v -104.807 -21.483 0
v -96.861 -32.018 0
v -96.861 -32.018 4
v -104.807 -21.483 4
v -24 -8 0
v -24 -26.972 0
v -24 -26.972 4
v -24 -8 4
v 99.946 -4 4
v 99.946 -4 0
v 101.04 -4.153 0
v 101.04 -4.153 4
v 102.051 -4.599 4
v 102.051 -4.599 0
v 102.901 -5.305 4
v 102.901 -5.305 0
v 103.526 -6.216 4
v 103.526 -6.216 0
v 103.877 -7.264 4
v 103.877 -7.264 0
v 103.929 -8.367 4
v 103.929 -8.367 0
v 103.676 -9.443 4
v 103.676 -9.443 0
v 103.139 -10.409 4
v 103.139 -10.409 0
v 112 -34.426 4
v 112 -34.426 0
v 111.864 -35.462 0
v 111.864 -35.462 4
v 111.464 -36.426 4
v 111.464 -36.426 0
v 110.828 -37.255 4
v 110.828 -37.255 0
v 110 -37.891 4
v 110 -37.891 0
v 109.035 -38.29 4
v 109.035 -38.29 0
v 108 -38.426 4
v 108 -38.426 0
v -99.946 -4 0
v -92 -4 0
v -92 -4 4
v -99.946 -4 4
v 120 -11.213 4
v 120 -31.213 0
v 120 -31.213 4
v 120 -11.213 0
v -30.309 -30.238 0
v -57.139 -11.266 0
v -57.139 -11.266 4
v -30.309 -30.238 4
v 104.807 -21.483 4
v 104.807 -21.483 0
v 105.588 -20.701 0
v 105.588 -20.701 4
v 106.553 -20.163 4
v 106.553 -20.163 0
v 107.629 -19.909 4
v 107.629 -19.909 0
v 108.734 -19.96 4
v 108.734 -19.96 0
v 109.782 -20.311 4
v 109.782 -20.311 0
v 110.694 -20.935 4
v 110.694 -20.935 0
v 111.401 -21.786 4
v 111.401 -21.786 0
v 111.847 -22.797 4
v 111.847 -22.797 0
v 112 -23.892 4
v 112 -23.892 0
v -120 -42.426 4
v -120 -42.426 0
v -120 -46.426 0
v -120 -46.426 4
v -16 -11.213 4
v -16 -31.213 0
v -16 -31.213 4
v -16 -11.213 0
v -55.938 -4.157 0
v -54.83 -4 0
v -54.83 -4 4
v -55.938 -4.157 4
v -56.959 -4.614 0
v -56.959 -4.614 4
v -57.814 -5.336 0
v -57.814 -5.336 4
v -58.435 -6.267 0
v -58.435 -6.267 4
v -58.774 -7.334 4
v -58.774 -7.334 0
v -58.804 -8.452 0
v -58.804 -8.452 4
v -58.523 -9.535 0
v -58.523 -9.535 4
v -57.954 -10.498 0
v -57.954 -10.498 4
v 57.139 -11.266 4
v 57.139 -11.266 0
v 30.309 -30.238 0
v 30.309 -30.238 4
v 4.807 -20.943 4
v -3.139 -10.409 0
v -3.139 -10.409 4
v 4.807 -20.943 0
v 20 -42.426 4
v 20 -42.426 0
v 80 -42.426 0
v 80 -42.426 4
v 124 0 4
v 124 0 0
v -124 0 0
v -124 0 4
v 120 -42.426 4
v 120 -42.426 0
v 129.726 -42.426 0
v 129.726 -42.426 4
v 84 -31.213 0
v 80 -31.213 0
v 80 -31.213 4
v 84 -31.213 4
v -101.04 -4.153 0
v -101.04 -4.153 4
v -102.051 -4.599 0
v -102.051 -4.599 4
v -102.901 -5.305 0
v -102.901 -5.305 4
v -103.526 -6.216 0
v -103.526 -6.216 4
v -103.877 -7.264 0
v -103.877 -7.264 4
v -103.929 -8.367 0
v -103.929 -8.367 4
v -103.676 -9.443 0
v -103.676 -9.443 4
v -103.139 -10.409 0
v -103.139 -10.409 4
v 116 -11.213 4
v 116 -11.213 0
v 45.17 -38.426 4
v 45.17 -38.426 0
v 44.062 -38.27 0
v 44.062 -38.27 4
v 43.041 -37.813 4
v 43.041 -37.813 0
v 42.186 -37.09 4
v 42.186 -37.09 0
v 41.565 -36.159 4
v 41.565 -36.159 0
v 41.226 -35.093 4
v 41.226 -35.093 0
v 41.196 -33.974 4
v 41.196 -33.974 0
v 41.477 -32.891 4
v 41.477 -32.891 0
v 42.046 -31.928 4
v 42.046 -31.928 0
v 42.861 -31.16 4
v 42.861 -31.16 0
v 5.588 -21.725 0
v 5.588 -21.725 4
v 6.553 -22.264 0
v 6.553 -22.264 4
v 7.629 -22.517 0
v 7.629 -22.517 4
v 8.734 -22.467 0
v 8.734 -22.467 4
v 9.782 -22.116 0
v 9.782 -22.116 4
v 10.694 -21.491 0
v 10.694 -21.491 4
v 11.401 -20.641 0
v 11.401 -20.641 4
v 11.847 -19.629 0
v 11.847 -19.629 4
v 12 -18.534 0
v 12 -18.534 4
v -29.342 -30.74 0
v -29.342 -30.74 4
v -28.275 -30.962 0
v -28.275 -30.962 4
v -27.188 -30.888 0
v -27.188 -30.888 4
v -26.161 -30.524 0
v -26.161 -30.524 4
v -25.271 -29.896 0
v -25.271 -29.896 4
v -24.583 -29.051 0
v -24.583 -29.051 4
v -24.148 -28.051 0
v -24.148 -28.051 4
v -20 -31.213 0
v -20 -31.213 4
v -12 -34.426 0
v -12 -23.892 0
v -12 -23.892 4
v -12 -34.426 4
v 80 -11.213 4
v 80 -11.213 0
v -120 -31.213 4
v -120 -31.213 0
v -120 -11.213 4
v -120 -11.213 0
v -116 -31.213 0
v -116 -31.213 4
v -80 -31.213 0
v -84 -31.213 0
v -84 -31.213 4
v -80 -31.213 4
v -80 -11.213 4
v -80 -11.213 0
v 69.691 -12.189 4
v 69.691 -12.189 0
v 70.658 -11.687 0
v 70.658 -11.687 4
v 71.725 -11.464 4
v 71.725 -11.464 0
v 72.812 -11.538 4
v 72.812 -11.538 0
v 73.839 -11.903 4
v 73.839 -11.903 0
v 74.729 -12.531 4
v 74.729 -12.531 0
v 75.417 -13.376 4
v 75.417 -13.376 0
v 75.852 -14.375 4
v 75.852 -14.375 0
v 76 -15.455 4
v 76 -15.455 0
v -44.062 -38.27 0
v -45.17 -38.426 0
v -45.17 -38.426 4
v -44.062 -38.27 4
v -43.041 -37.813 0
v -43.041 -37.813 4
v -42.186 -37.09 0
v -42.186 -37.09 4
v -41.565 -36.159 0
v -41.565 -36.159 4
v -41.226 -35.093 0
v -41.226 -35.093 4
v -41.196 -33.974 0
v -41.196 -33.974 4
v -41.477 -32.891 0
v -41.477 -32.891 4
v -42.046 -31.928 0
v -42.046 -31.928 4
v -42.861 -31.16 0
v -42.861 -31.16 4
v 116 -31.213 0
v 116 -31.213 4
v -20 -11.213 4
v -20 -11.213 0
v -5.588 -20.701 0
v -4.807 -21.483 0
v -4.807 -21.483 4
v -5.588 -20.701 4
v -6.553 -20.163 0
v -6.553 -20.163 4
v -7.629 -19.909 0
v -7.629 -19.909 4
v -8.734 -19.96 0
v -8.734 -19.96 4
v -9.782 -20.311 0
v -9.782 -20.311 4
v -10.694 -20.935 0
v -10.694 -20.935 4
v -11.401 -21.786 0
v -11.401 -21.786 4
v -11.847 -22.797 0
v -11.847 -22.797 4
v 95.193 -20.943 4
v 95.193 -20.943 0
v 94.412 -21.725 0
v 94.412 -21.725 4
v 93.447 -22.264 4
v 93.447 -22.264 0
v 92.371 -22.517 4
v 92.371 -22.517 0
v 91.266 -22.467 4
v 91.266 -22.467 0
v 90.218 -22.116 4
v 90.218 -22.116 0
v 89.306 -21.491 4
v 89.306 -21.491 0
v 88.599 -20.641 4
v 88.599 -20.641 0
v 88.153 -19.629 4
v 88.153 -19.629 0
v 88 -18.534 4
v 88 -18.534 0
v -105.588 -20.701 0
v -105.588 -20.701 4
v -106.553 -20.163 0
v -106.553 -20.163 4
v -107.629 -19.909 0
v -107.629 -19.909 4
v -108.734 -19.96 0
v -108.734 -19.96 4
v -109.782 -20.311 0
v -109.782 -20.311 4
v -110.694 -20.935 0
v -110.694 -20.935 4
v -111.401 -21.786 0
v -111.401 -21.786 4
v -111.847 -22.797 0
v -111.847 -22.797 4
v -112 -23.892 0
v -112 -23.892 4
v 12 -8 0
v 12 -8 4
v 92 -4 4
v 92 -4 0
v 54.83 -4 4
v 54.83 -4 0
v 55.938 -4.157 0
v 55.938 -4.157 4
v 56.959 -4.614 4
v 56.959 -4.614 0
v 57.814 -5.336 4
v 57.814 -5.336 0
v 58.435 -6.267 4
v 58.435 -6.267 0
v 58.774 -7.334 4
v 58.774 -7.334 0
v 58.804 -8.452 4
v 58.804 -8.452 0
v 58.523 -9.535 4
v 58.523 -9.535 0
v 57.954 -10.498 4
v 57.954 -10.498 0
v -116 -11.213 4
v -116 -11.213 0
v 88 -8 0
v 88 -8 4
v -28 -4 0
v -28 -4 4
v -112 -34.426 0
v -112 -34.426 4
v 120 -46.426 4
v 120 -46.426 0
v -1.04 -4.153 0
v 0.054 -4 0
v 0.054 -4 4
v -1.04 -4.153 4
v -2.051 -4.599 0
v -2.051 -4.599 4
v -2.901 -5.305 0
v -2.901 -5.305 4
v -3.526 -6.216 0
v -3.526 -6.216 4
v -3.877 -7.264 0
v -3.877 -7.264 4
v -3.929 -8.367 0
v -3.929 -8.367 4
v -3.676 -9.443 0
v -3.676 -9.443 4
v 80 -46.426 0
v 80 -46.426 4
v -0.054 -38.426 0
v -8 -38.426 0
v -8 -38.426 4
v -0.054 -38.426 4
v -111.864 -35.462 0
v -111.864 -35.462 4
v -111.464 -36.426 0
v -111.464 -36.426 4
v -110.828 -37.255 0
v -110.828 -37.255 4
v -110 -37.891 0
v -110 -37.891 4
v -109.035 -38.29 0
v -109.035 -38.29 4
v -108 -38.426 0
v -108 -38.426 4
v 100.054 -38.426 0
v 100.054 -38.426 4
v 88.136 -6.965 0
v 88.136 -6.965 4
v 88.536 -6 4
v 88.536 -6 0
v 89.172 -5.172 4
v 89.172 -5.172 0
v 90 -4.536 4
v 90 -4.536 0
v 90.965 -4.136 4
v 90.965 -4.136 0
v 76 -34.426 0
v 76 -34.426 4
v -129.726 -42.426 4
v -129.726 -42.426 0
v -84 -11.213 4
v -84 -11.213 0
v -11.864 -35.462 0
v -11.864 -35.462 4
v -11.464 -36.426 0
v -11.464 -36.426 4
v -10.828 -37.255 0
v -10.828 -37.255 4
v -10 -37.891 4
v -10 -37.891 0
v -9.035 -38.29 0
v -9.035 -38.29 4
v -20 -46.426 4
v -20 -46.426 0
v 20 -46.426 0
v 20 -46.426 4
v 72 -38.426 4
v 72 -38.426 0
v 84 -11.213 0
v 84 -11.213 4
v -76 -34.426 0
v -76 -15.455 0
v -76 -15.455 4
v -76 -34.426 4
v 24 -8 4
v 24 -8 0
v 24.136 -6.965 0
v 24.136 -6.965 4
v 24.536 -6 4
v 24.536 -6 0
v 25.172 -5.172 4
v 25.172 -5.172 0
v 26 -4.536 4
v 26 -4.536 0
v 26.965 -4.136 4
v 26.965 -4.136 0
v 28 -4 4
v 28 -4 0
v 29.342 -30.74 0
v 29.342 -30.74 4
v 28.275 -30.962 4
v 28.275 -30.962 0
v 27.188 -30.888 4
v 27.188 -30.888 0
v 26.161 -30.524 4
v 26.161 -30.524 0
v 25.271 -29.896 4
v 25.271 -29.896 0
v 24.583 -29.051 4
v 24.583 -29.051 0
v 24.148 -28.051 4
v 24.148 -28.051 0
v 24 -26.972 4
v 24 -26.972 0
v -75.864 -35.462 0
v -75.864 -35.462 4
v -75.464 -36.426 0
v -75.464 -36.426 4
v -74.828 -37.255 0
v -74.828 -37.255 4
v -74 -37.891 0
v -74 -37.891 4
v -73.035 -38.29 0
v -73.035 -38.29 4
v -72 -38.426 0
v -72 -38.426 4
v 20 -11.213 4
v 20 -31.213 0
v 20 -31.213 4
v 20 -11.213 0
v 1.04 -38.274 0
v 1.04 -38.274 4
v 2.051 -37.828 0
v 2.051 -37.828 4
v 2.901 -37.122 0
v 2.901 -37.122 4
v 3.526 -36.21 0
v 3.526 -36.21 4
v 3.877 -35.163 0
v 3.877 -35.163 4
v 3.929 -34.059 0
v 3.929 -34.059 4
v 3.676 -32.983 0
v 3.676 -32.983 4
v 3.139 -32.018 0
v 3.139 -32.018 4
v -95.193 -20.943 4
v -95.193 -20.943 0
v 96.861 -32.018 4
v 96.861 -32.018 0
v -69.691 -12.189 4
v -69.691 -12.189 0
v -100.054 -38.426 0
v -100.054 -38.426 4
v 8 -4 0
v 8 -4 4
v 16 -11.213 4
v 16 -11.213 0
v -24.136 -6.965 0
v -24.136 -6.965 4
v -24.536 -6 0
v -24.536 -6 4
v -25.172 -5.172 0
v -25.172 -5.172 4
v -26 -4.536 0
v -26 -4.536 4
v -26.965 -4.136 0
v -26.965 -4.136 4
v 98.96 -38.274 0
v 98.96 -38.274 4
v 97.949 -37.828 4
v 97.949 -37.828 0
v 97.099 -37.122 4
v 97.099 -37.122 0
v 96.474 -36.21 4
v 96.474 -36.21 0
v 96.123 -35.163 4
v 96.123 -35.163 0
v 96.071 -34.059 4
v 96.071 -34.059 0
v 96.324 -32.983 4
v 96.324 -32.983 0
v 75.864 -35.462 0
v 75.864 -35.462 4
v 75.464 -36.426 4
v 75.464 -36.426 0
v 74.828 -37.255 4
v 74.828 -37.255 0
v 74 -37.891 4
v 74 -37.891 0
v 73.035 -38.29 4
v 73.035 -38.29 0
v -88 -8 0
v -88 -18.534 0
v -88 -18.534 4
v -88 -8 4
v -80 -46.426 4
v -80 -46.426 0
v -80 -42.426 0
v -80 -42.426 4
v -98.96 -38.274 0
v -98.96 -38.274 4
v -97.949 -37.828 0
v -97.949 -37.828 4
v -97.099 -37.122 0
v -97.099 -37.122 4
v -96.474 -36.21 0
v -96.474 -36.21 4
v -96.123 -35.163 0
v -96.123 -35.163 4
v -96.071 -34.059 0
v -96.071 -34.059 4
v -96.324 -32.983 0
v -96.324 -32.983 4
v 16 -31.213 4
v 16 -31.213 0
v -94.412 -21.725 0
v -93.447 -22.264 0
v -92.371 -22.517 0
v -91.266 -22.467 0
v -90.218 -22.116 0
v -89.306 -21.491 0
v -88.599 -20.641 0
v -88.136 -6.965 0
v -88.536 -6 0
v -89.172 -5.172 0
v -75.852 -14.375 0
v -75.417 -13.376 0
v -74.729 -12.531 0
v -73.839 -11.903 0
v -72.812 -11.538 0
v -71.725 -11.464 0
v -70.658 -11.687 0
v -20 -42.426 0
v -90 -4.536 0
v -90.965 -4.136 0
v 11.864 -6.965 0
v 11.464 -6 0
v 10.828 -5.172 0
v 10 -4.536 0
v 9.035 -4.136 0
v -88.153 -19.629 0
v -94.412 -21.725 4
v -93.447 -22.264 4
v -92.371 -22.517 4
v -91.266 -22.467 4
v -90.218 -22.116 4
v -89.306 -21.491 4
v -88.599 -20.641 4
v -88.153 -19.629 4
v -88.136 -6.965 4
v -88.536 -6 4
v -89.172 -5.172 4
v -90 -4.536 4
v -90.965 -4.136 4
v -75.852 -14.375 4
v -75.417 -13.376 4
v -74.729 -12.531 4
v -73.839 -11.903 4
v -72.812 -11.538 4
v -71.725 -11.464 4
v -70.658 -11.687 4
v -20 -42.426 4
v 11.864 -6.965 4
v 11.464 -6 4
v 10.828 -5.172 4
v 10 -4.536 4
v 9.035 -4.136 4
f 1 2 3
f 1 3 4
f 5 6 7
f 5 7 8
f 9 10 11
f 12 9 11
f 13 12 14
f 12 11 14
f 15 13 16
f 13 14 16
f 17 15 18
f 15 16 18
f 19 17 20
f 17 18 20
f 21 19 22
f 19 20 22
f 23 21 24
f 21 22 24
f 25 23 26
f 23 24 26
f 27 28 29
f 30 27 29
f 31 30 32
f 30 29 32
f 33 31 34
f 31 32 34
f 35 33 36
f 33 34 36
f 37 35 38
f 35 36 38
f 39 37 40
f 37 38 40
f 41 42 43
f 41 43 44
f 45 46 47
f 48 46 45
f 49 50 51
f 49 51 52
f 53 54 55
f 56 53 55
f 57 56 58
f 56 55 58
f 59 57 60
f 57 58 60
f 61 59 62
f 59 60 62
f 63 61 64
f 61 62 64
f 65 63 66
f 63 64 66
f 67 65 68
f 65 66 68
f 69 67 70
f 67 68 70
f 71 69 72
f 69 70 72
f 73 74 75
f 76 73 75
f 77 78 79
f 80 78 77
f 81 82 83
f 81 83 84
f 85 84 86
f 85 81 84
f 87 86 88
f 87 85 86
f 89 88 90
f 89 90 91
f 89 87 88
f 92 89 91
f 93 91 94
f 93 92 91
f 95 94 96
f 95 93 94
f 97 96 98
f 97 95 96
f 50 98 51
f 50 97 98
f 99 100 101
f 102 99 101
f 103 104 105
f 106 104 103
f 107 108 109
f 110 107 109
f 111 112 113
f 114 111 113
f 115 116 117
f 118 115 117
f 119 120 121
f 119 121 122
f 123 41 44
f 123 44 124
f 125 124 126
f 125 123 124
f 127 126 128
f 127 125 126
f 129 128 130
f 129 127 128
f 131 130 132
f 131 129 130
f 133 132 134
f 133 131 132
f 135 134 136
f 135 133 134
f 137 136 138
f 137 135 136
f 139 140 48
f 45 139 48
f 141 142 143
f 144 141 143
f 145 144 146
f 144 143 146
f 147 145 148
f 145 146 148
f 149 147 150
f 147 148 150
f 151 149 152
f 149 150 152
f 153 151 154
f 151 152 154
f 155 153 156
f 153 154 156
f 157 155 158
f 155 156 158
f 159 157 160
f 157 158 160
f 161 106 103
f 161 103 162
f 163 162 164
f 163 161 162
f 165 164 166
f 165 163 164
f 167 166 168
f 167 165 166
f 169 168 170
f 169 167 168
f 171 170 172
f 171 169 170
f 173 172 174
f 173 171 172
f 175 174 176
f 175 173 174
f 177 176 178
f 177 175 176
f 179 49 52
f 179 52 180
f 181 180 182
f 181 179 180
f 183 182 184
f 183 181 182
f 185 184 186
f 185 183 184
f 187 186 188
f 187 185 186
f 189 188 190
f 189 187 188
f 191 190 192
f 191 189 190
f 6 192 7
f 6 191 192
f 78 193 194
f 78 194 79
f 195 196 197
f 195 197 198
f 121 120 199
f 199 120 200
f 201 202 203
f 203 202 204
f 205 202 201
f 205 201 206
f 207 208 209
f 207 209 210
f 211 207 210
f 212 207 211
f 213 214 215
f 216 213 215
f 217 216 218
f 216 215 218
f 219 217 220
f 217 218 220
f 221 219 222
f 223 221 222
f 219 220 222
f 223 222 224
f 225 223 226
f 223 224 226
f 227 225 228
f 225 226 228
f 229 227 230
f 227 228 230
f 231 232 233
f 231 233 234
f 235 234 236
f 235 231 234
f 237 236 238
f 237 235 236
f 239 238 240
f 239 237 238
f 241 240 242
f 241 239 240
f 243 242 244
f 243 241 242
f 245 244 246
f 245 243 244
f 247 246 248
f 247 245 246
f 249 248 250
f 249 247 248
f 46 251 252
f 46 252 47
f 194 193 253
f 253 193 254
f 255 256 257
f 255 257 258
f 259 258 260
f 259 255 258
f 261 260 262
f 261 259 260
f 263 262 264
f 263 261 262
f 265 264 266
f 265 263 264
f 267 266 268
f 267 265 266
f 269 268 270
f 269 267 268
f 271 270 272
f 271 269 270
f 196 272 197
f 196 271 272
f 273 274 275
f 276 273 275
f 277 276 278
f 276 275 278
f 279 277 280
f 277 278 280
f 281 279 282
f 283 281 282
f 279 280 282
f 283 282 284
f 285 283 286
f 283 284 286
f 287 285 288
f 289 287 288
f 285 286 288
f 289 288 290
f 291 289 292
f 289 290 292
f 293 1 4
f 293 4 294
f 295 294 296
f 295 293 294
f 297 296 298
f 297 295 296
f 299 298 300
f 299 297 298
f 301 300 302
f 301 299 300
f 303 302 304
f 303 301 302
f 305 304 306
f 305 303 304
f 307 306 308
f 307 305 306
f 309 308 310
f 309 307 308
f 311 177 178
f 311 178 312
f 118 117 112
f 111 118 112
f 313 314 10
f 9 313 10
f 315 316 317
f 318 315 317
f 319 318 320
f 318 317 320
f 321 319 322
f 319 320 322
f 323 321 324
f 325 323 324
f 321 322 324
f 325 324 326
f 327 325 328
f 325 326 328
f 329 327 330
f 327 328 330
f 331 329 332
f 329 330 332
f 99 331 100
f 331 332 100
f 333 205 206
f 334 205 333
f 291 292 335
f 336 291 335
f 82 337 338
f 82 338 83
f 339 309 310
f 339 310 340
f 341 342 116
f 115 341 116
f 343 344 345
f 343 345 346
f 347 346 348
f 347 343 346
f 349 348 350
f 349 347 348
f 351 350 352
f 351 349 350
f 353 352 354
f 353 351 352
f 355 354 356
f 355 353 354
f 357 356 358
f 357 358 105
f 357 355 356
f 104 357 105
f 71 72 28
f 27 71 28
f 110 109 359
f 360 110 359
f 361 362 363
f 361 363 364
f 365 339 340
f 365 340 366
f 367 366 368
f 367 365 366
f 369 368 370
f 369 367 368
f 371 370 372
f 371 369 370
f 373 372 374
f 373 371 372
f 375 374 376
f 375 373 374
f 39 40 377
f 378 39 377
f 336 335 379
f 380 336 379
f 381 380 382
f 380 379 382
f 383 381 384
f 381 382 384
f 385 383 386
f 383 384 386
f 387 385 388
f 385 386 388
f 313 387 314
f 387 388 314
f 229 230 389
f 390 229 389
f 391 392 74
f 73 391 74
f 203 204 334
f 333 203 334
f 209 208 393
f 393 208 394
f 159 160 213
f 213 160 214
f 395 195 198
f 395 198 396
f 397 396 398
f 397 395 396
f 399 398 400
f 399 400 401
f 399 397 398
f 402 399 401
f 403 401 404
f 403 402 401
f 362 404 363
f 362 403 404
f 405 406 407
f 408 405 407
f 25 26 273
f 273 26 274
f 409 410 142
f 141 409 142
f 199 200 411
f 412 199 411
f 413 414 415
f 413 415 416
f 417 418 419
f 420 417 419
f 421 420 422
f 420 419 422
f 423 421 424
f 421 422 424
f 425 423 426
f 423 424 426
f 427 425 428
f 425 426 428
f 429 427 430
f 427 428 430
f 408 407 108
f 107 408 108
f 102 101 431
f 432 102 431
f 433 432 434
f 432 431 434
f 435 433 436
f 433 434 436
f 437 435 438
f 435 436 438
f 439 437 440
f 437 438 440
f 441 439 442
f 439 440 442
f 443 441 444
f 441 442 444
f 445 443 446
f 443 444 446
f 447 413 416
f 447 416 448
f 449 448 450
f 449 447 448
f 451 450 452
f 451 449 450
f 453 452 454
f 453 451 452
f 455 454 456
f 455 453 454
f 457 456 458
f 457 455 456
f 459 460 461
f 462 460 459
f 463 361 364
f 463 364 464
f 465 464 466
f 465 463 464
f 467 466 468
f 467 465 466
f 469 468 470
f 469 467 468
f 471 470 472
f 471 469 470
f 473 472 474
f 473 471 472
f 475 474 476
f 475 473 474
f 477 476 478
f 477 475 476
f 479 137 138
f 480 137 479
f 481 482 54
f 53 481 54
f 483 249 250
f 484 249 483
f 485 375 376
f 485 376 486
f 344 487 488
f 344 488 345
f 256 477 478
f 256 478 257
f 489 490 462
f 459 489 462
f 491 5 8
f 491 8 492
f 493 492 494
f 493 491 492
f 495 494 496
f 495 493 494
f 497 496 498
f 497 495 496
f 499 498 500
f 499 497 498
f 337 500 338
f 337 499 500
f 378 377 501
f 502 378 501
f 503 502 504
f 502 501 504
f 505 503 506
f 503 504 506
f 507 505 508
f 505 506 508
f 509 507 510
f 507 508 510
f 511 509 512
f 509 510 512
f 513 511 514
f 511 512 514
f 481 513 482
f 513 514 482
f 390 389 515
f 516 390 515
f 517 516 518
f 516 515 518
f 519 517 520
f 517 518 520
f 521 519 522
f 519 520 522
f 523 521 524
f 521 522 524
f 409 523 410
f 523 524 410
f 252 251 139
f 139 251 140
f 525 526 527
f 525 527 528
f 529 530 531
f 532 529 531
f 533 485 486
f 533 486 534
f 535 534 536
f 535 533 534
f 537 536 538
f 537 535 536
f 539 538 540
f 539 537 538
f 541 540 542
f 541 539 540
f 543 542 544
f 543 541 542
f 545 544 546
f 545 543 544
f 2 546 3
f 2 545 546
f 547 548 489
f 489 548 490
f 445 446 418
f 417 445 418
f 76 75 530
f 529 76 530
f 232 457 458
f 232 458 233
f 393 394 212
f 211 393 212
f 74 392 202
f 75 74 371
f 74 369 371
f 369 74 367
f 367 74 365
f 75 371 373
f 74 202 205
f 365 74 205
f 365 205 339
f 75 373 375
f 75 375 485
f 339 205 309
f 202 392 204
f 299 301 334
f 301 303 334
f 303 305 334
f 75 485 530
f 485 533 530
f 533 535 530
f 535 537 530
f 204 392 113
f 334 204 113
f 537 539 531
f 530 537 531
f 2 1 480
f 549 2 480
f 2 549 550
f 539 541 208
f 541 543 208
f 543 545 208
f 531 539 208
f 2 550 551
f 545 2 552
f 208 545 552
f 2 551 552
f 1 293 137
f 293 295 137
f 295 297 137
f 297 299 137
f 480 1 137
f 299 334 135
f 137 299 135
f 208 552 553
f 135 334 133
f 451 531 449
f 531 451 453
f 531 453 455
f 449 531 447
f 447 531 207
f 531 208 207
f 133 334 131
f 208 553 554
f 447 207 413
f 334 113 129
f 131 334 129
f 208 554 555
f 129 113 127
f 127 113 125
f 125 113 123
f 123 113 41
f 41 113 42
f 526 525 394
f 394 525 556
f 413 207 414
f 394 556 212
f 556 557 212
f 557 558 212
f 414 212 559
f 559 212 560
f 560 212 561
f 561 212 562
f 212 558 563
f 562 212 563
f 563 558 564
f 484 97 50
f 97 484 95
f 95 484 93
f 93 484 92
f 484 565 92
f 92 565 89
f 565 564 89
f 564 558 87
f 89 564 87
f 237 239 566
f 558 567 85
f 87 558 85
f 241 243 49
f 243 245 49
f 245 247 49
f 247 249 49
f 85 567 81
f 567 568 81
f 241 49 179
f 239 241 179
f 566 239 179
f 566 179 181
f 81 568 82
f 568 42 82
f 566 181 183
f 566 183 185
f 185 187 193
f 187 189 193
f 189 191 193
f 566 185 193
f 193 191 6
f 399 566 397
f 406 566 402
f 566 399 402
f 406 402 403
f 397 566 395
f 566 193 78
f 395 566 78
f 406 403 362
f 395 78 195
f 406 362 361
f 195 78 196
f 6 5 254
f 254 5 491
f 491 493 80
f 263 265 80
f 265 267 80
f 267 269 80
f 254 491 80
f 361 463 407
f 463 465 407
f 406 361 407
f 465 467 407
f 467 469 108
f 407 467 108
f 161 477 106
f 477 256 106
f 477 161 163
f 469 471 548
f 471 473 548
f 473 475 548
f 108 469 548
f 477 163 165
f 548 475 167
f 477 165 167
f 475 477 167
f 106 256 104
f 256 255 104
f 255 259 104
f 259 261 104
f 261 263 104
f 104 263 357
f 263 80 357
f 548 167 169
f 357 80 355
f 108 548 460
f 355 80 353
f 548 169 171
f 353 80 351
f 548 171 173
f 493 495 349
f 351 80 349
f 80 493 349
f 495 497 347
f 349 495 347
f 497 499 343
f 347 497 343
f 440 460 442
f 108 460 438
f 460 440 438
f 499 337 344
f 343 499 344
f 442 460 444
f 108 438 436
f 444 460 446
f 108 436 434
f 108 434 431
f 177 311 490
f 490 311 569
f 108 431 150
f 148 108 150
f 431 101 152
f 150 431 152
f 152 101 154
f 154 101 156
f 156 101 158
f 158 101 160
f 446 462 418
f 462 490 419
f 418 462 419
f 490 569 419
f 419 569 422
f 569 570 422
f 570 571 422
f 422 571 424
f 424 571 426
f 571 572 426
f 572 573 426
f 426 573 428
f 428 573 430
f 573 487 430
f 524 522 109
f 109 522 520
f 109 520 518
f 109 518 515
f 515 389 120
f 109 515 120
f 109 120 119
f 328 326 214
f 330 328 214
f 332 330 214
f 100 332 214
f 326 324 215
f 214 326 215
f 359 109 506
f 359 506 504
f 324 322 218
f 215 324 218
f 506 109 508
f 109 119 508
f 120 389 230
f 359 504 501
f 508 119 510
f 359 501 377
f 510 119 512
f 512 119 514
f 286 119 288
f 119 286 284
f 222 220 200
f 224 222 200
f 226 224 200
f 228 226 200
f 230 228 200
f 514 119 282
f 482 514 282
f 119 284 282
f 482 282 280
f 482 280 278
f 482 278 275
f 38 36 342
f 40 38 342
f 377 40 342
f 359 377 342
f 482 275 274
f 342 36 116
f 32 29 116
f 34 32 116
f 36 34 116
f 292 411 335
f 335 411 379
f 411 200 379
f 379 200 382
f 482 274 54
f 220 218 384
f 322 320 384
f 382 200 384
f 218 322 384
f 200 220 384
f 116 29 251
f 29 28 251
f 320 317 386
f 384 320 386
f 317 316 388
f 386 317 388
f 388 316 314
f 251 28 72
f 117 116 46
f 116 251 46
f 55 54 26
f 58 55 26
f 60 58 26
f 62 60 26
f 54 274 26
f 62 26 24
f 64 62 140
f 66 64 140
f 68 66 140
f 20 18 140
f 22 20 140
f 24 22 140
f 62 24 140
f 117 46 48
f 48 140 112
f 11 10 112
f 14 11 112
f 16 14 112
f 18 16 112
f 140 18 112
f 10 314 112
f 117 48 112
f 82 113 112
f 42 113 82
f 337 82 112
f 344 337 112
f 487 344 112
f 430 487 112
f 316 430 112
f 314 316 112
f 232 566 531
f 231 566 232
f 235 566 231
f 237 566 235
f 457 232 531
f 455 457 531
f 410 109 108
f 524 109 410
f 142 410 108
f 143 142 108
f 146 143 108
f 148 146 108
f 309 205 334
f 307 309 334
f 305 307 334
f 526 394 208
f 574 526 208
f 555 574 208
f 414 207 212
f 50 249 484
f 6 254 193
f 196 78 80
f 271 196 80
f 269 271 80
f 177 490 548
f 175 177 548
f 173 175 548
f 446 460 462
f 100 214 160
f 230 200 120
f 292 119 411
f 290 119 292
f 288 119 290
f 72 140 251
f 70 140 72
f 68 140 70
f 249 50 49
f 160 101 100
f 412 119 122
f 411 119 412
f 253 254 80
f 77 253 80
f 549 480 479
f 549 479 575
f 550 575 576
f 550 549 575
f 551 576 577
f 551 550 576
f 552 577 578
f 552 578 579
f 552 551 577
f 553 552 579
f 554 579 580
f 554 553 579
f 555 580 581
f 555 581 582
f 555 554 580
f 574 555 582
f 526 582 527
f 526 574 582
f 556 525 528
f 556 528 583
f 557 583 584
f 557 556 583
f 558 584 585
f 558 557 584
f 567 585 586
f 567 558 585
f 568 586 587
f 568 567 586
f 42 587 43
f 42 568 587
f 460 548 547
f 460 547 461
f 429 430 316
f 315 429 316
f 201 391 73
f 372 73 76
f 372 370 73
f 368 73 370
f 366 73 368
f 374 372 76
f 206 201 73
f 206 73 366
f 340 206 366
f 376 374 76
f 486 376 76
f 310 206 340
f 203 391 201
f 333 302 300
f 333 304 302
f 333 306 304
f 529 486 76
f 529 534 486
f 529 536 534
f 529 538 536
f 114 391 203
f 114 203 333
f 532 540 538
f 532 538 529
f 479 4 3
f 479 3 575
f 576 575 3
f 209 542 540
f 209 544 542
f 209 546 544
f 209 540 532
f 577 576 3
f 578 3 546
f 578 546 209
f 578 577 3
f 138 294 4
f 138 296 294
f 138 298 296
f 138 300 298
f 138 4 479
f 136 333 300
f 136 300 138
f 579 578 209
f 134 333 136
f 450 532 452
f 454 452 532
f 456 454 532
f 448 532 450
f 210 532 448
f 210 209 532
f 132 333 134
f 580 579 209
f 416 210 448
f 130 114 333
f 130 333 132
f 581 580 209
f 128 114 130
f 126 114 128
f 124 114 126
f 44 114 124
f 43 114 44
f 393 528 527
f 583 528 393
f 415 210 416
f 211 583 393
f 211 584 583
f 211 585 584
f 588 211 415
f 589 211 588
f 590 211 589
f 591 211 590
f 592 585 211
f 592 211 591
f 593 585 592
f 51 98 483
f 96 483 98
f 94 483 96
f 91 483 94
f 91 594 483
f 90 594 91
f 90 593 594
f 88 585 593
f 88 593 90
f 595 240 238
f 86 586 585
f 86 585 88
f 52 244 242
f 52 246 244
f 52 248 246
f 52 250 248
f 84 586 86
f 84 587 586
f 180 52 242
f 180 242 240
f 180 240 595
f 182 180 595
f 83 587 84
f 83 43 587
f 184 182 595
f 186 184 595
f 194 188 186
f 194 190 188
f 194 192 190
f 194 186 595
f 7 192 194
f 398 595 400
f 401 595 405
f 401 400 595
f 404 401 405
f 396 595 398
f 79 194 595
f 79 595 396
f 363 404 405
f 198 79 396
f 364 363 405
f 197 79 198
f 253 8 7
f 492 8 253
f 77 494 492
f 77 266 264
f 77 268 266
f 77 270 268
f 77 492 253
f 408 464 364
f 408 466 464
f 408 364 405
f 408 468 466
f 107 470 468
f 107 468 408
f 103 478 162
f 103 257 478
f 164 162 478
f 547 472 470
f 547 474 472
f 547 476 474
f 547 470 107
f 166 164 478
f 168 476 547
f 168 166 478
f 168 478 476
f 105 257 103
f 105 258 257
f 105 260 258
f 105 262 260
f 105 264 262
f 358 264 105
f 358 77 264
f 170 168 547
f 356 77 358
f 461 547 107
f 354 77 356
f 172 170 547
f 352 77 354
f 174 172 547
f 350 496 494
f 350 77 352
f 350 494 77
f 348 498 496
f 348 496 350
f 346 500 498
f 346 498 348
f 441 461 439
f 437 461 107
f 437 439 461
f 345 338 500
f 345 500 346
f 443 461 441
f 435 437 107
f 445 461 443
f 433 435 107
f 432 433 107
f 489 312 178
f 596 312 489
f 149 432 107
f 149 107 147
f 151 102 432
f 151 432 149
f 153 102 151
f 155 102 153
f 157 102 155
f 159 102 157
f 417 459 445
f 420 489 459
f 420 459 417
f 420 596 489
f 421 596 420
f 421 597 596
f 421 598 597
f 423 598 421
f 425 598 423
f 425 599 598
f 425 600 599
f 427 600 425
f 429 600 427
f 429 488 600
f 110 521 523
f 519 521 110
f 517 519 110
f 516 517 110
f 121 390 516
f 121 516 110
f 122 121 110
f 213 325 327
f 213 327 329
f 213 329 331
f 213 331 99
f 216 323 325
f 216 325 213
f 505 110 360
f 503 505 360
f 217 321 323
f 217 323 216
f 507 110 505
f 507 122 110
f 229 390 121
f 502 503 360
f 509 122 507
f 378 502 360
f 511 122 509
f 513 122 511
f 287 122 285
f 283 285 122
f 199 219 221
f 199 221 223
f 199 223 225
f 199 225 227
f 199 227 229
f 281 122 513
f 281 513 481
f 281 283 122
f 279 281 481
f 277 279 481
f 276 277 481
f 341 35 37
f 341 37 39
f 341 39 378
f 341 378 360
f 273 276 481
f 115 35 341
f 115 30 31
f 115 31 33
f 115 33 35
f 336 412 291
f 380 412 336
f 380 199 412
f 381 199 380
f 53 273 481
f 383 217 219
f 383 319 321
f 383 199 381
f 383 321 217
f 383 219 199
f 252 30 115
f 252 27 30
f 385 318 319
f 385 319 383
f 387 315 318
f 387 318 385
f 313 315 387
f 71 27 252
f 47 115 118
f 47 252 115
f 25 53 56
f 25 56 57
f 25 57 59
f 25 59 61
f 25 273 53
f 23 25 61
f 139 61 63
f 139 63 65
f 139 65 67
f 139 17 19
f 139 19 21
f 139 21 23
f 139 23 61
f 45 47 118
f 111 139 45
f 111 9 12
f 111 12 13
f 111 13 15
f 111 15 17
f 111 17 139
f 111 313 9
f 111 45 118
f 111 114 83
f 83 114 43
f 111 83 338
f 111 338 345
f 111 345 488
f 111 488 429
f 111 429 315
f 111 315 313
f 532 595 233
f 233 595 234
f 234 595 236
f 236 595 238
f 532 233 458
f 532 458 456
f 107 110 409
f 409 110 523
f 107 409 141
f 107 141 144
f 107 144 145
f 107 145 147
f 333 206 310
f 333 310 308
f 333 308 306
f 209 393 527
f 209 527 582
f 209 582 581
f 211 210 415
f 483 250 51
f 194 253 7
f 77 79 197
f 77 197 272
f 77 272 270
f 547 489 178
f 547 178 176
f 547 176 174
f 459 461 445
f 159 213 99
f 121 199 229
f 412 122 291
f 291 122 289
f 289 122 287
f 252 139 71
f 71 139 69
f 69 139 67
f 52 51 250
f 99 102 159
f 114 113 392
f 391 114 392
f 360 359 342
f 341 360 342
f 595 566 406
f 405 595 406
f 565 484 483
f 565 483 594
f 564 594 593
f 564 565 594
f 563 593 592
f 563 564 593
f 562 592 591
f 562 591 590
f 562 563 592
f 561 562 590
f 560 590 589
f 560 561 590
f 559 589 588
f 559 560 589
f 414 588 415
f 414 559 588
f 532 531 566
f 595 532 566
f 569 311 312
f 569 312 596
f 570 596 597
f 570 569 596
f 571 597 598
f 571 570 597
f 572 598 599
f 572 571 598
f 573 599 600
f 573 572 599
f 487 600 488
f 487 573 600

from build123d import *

# Parameters (mm, degrees)
SKETCH2_W           = 4
SKETCH2_H           = 20
BOSS_EXTRUDE1_DEPTH = 4


with BuildPart() as part:
    # Sketch2 → Boss-Extrude1 (new body)
    with BuildSketch(Plane.XY):
        Polygon((124, 0), (-124, 0), (-129.725981227, -42.426406871), (-120, -42.426406871), (-120, -46.426406871), (-80, -46.426406871), (-80, -42.426406871), (-20, -42.426406871), (-20, -46.426406871), (20, -46.426406871), (20, -42.426406871), (80, -42.426406871), (80, -46.426406871), (120, -46.426406871), (120, -42.426406871), (129.725981227, -42.426406871), align=None)
        with BuildLine():
            Line((-88, -18.534474898), (-88, -8))
            ThreePointArc((-88, -8), (-89.171572875, -5.171572875), (-92, -4))
            Line((-92, -4), (-99.945598546, -4))
            ThreePointArc((-99.945598546, -4), (-103.525730324, -6.215999874), (-103.139076318, -10.408671774))
            Line((-103.139076318, -10.408671774), (-95.193477772, -20.943146672))
            ThreePointArc((-95.193477772, -20.943146672), (-90.729943129, -22.327488943), (-88, -18.534474898))
        make_face(mode=Mode.SUBTRACT)
        with BuildLine():
            Line((-108, -38.426406871), (-100.054401454, -38.426406871))
            ThreePointArc((-100.054401454, -38.426406871), (-96.474269676, -36.210406998), (-96.860923682, -32.017735097))
            Line((-96.860923682, -32.017735097), (-104.806522228, -21.483260199))
            ThreePointArc((-104.806522228, -21.483260199), (-109.270056871, -20.098917928), (-112, -23.891931973))
            Line((-112, -23.891931973), (-112, -34.426406871))
            ThreePointArc((-112, -34.426406871), (-110.828427125, -37.254833996), (-108, -38.426406871))
        make_face(mode=Mode.SUBTRACT)
        with BuildLine():
            Line((-57.139286117, -11.265986324), (-30.309401077, -30.237579974))
            ThreePointArc((-30.309401077, -30.237579974), (-26.161196626, -30.523888986), (-24, -26.971593651))
            Line((-24, -26.971593651), (-24, -8))
            ThreePointArc((-24, -8), (-25.171572875, -5.171572875), (-28, -4))
            Line((-28, -4), (-54.82988504, -4))
            ThreePointArc((-54.82988504, -4), (-58.641967496, -6.788378214), (-57.139286117, -11.265986324))
        make_face(mode=Mode.SUBTRACT)
        with BuildLine():
            Line((-42.860713883, -31.160420547), (-69.690598923, -12.188826897))
            ThreePointArc((-69.690598923, -12.188826897), (-73.838803374, -11.902517885), (-76, -15.454813221))
            Line((-76, -15.454813221), (-76, -34.426406871))
            ThreePointArc((-76, -34.426406871), (-74.828427125, -37.254833996), (-72, -38.426406871))
            Line((-72, -38.426406871), (-45.17011496, -38.426406871))
            ThreePointArc((-45.17011496, -38.426406871), (-41.358032504, -35.638028657), (-42.860713883, -31.160420547))
        make_face(mode=Mode.SUBTRACT)
        with BuildLine():
            Line((3.139076318, -32.017735097), (-4.806522228, -21.483260199))
            ThreePointArc((-4.806522228, -21.483260199), (-9.270056871, -20.098917928), (-12, -23.891931973))
            Line((-12, -23.891931973), (-12, -34.426406871))
            ThreePointArc((-12, -34.426406871), (-10.828427125, -37.254833996), (-8, -38.426406871))
            Line((-8, -38.426406871), (-0.054401454, -38.426406871))
            ThreePointArc((-0.054401454, -38.426406871), (3.525730324, -36.210406998), (3.139076318, -32.017735097))
        make_face(mode=Mode.SUBTRACT)
        with BuildLine():
            Line((12, -18.534474898), (12, -8))
            ThreePointArc((12, -8), (10.828427125, -5.171572875), (8, -4))
            Line((8, -4), (0.054401454, -4))
            ThreePointArc((0.054401454, -4), (-3.525730324, -6.215999874), (-3.139076318, -10.408671774))
            Line((-3.139076318, -10.408671774), (4.806522228, -20.943146672))
            ThreePointArc((4.806522228, -20.943146672), (9.270056871, -22.327488943), (12, -18.534474898))
        make_face(mode=Mode.SUBTRACT)
        with BuildLine():
            Line((112, -23.891931973), (112, -34.426406871))
            ThreePointArc((112, -34.426406871), (110.828427125, -37.254833996), (108, -38.426406871))
            Line((108, -38.426406871), (100.054401454, -38.426406871))
            ThreePointArc((100.054401454, -38.426406871), (96.474269676, -36.210406998), (96.860923682, -32.017735097))
            Line((96.860923682, -32.017735097), (104.806522228, -21.483260199))
            ThreePointArc((104.806522228, -21.483260199), (109.270056871, -20.098917928), (112, -23.891931973))
        make_face(mode=Mode.SUBTRACT)
        with BuildLine():
            Line((103.139076318, -10.408671774), (95.193477772, -20.943146672))
            ThreePointArc((95.193477772, -20.943146672), (90.729943129, -22.327488943), (88, -18.534474898))
            Line((88, -18.534474898), (88, -8))
            ThreePointArc((88, -8), (89.171572875, -5.171572875), (92, -4))
            Line((92, -4), (99.945598546, -4))
            ThreePointArc((99.945598546, -4), (103.525730324, -6.215999874), (103.139076318, -10.408671774))
        make_face(mode=Mode.SUBTRACT)
        with BuildLine():
            Line((28, -4), (54.82988504, -4))
            ThreePointArc((54.82988504, -4), (58.641967496, -6.788378214), (57.139286117, -11.265986324))
            Line((57.139286117, -11.265986324), (30.309401077, -30.237579974))
            ThreePointArc((30.309401077, -30.237579974), (26.161196626, -30.523888986), (24, -26.971593651))
            Line((24, -26.971593651), (24, -8))
            ThreePointArc((24, -8), (25.171572875, -5.171572875), (28, -4))
        make_face(mode=Mode.SUBTRACT)
        with BuildLine():
            Line((72, -38.426406871), (45.17011496, -38.426406871))
            ThreePointArc((45.17011496, -38.426406871), (41.358032504, -35.638028657), (42.860713883, -31.160420547))
            Line((42.860713883, -31.160420547), (69.690598923, -12.188826897))
            ThreePointArc((69.690598923, -12.188826897), (73.838803374, -11.902517885), (76, -15.454813221))
            Line((76, -15.454813221), (76, -34.426406871))
            ThreePointArc((76, -34.426406871), (74.828427125, -37.254833996), (72, -38.426406871))
        make_face(mode=Mode.SUBTRACT)
        with Locations((-118, -21.213203436)):
            Rectangle(SKETCH2_W, SKETCH2_H, mode=Mode.SUBTRACT)
        with Locations((-18, -21.213203436)):
            Rectangle(SKETCH2_W, SKETCH2_H, mode=Mode.SUBTRACT)
        with Locations((-82, -21.213203436)):
            Rectangle(SKETCH2_W, SKETCH2_H, mode=Mode.SUBTRACT)
        with Locations((18, -21.213203436)):
            Rectangle(SKETCH2_W, SKETCH2_H, mode=Mode.SUBTRACT)
        with Locations((82, -21.213203436)):
            Rectangle(SKETCH2_W, SKETCH2_H, mode=Mode.SUBTRACT)
        with Locations((118, -21.213203436)):
            Rectangle(SKETCH2_W, SKETCH2_H, mode=Mode.SUBTRACT)
    extrude(amount=BOSS_EXTRUDE1_DEPTH)


solid = part.part
